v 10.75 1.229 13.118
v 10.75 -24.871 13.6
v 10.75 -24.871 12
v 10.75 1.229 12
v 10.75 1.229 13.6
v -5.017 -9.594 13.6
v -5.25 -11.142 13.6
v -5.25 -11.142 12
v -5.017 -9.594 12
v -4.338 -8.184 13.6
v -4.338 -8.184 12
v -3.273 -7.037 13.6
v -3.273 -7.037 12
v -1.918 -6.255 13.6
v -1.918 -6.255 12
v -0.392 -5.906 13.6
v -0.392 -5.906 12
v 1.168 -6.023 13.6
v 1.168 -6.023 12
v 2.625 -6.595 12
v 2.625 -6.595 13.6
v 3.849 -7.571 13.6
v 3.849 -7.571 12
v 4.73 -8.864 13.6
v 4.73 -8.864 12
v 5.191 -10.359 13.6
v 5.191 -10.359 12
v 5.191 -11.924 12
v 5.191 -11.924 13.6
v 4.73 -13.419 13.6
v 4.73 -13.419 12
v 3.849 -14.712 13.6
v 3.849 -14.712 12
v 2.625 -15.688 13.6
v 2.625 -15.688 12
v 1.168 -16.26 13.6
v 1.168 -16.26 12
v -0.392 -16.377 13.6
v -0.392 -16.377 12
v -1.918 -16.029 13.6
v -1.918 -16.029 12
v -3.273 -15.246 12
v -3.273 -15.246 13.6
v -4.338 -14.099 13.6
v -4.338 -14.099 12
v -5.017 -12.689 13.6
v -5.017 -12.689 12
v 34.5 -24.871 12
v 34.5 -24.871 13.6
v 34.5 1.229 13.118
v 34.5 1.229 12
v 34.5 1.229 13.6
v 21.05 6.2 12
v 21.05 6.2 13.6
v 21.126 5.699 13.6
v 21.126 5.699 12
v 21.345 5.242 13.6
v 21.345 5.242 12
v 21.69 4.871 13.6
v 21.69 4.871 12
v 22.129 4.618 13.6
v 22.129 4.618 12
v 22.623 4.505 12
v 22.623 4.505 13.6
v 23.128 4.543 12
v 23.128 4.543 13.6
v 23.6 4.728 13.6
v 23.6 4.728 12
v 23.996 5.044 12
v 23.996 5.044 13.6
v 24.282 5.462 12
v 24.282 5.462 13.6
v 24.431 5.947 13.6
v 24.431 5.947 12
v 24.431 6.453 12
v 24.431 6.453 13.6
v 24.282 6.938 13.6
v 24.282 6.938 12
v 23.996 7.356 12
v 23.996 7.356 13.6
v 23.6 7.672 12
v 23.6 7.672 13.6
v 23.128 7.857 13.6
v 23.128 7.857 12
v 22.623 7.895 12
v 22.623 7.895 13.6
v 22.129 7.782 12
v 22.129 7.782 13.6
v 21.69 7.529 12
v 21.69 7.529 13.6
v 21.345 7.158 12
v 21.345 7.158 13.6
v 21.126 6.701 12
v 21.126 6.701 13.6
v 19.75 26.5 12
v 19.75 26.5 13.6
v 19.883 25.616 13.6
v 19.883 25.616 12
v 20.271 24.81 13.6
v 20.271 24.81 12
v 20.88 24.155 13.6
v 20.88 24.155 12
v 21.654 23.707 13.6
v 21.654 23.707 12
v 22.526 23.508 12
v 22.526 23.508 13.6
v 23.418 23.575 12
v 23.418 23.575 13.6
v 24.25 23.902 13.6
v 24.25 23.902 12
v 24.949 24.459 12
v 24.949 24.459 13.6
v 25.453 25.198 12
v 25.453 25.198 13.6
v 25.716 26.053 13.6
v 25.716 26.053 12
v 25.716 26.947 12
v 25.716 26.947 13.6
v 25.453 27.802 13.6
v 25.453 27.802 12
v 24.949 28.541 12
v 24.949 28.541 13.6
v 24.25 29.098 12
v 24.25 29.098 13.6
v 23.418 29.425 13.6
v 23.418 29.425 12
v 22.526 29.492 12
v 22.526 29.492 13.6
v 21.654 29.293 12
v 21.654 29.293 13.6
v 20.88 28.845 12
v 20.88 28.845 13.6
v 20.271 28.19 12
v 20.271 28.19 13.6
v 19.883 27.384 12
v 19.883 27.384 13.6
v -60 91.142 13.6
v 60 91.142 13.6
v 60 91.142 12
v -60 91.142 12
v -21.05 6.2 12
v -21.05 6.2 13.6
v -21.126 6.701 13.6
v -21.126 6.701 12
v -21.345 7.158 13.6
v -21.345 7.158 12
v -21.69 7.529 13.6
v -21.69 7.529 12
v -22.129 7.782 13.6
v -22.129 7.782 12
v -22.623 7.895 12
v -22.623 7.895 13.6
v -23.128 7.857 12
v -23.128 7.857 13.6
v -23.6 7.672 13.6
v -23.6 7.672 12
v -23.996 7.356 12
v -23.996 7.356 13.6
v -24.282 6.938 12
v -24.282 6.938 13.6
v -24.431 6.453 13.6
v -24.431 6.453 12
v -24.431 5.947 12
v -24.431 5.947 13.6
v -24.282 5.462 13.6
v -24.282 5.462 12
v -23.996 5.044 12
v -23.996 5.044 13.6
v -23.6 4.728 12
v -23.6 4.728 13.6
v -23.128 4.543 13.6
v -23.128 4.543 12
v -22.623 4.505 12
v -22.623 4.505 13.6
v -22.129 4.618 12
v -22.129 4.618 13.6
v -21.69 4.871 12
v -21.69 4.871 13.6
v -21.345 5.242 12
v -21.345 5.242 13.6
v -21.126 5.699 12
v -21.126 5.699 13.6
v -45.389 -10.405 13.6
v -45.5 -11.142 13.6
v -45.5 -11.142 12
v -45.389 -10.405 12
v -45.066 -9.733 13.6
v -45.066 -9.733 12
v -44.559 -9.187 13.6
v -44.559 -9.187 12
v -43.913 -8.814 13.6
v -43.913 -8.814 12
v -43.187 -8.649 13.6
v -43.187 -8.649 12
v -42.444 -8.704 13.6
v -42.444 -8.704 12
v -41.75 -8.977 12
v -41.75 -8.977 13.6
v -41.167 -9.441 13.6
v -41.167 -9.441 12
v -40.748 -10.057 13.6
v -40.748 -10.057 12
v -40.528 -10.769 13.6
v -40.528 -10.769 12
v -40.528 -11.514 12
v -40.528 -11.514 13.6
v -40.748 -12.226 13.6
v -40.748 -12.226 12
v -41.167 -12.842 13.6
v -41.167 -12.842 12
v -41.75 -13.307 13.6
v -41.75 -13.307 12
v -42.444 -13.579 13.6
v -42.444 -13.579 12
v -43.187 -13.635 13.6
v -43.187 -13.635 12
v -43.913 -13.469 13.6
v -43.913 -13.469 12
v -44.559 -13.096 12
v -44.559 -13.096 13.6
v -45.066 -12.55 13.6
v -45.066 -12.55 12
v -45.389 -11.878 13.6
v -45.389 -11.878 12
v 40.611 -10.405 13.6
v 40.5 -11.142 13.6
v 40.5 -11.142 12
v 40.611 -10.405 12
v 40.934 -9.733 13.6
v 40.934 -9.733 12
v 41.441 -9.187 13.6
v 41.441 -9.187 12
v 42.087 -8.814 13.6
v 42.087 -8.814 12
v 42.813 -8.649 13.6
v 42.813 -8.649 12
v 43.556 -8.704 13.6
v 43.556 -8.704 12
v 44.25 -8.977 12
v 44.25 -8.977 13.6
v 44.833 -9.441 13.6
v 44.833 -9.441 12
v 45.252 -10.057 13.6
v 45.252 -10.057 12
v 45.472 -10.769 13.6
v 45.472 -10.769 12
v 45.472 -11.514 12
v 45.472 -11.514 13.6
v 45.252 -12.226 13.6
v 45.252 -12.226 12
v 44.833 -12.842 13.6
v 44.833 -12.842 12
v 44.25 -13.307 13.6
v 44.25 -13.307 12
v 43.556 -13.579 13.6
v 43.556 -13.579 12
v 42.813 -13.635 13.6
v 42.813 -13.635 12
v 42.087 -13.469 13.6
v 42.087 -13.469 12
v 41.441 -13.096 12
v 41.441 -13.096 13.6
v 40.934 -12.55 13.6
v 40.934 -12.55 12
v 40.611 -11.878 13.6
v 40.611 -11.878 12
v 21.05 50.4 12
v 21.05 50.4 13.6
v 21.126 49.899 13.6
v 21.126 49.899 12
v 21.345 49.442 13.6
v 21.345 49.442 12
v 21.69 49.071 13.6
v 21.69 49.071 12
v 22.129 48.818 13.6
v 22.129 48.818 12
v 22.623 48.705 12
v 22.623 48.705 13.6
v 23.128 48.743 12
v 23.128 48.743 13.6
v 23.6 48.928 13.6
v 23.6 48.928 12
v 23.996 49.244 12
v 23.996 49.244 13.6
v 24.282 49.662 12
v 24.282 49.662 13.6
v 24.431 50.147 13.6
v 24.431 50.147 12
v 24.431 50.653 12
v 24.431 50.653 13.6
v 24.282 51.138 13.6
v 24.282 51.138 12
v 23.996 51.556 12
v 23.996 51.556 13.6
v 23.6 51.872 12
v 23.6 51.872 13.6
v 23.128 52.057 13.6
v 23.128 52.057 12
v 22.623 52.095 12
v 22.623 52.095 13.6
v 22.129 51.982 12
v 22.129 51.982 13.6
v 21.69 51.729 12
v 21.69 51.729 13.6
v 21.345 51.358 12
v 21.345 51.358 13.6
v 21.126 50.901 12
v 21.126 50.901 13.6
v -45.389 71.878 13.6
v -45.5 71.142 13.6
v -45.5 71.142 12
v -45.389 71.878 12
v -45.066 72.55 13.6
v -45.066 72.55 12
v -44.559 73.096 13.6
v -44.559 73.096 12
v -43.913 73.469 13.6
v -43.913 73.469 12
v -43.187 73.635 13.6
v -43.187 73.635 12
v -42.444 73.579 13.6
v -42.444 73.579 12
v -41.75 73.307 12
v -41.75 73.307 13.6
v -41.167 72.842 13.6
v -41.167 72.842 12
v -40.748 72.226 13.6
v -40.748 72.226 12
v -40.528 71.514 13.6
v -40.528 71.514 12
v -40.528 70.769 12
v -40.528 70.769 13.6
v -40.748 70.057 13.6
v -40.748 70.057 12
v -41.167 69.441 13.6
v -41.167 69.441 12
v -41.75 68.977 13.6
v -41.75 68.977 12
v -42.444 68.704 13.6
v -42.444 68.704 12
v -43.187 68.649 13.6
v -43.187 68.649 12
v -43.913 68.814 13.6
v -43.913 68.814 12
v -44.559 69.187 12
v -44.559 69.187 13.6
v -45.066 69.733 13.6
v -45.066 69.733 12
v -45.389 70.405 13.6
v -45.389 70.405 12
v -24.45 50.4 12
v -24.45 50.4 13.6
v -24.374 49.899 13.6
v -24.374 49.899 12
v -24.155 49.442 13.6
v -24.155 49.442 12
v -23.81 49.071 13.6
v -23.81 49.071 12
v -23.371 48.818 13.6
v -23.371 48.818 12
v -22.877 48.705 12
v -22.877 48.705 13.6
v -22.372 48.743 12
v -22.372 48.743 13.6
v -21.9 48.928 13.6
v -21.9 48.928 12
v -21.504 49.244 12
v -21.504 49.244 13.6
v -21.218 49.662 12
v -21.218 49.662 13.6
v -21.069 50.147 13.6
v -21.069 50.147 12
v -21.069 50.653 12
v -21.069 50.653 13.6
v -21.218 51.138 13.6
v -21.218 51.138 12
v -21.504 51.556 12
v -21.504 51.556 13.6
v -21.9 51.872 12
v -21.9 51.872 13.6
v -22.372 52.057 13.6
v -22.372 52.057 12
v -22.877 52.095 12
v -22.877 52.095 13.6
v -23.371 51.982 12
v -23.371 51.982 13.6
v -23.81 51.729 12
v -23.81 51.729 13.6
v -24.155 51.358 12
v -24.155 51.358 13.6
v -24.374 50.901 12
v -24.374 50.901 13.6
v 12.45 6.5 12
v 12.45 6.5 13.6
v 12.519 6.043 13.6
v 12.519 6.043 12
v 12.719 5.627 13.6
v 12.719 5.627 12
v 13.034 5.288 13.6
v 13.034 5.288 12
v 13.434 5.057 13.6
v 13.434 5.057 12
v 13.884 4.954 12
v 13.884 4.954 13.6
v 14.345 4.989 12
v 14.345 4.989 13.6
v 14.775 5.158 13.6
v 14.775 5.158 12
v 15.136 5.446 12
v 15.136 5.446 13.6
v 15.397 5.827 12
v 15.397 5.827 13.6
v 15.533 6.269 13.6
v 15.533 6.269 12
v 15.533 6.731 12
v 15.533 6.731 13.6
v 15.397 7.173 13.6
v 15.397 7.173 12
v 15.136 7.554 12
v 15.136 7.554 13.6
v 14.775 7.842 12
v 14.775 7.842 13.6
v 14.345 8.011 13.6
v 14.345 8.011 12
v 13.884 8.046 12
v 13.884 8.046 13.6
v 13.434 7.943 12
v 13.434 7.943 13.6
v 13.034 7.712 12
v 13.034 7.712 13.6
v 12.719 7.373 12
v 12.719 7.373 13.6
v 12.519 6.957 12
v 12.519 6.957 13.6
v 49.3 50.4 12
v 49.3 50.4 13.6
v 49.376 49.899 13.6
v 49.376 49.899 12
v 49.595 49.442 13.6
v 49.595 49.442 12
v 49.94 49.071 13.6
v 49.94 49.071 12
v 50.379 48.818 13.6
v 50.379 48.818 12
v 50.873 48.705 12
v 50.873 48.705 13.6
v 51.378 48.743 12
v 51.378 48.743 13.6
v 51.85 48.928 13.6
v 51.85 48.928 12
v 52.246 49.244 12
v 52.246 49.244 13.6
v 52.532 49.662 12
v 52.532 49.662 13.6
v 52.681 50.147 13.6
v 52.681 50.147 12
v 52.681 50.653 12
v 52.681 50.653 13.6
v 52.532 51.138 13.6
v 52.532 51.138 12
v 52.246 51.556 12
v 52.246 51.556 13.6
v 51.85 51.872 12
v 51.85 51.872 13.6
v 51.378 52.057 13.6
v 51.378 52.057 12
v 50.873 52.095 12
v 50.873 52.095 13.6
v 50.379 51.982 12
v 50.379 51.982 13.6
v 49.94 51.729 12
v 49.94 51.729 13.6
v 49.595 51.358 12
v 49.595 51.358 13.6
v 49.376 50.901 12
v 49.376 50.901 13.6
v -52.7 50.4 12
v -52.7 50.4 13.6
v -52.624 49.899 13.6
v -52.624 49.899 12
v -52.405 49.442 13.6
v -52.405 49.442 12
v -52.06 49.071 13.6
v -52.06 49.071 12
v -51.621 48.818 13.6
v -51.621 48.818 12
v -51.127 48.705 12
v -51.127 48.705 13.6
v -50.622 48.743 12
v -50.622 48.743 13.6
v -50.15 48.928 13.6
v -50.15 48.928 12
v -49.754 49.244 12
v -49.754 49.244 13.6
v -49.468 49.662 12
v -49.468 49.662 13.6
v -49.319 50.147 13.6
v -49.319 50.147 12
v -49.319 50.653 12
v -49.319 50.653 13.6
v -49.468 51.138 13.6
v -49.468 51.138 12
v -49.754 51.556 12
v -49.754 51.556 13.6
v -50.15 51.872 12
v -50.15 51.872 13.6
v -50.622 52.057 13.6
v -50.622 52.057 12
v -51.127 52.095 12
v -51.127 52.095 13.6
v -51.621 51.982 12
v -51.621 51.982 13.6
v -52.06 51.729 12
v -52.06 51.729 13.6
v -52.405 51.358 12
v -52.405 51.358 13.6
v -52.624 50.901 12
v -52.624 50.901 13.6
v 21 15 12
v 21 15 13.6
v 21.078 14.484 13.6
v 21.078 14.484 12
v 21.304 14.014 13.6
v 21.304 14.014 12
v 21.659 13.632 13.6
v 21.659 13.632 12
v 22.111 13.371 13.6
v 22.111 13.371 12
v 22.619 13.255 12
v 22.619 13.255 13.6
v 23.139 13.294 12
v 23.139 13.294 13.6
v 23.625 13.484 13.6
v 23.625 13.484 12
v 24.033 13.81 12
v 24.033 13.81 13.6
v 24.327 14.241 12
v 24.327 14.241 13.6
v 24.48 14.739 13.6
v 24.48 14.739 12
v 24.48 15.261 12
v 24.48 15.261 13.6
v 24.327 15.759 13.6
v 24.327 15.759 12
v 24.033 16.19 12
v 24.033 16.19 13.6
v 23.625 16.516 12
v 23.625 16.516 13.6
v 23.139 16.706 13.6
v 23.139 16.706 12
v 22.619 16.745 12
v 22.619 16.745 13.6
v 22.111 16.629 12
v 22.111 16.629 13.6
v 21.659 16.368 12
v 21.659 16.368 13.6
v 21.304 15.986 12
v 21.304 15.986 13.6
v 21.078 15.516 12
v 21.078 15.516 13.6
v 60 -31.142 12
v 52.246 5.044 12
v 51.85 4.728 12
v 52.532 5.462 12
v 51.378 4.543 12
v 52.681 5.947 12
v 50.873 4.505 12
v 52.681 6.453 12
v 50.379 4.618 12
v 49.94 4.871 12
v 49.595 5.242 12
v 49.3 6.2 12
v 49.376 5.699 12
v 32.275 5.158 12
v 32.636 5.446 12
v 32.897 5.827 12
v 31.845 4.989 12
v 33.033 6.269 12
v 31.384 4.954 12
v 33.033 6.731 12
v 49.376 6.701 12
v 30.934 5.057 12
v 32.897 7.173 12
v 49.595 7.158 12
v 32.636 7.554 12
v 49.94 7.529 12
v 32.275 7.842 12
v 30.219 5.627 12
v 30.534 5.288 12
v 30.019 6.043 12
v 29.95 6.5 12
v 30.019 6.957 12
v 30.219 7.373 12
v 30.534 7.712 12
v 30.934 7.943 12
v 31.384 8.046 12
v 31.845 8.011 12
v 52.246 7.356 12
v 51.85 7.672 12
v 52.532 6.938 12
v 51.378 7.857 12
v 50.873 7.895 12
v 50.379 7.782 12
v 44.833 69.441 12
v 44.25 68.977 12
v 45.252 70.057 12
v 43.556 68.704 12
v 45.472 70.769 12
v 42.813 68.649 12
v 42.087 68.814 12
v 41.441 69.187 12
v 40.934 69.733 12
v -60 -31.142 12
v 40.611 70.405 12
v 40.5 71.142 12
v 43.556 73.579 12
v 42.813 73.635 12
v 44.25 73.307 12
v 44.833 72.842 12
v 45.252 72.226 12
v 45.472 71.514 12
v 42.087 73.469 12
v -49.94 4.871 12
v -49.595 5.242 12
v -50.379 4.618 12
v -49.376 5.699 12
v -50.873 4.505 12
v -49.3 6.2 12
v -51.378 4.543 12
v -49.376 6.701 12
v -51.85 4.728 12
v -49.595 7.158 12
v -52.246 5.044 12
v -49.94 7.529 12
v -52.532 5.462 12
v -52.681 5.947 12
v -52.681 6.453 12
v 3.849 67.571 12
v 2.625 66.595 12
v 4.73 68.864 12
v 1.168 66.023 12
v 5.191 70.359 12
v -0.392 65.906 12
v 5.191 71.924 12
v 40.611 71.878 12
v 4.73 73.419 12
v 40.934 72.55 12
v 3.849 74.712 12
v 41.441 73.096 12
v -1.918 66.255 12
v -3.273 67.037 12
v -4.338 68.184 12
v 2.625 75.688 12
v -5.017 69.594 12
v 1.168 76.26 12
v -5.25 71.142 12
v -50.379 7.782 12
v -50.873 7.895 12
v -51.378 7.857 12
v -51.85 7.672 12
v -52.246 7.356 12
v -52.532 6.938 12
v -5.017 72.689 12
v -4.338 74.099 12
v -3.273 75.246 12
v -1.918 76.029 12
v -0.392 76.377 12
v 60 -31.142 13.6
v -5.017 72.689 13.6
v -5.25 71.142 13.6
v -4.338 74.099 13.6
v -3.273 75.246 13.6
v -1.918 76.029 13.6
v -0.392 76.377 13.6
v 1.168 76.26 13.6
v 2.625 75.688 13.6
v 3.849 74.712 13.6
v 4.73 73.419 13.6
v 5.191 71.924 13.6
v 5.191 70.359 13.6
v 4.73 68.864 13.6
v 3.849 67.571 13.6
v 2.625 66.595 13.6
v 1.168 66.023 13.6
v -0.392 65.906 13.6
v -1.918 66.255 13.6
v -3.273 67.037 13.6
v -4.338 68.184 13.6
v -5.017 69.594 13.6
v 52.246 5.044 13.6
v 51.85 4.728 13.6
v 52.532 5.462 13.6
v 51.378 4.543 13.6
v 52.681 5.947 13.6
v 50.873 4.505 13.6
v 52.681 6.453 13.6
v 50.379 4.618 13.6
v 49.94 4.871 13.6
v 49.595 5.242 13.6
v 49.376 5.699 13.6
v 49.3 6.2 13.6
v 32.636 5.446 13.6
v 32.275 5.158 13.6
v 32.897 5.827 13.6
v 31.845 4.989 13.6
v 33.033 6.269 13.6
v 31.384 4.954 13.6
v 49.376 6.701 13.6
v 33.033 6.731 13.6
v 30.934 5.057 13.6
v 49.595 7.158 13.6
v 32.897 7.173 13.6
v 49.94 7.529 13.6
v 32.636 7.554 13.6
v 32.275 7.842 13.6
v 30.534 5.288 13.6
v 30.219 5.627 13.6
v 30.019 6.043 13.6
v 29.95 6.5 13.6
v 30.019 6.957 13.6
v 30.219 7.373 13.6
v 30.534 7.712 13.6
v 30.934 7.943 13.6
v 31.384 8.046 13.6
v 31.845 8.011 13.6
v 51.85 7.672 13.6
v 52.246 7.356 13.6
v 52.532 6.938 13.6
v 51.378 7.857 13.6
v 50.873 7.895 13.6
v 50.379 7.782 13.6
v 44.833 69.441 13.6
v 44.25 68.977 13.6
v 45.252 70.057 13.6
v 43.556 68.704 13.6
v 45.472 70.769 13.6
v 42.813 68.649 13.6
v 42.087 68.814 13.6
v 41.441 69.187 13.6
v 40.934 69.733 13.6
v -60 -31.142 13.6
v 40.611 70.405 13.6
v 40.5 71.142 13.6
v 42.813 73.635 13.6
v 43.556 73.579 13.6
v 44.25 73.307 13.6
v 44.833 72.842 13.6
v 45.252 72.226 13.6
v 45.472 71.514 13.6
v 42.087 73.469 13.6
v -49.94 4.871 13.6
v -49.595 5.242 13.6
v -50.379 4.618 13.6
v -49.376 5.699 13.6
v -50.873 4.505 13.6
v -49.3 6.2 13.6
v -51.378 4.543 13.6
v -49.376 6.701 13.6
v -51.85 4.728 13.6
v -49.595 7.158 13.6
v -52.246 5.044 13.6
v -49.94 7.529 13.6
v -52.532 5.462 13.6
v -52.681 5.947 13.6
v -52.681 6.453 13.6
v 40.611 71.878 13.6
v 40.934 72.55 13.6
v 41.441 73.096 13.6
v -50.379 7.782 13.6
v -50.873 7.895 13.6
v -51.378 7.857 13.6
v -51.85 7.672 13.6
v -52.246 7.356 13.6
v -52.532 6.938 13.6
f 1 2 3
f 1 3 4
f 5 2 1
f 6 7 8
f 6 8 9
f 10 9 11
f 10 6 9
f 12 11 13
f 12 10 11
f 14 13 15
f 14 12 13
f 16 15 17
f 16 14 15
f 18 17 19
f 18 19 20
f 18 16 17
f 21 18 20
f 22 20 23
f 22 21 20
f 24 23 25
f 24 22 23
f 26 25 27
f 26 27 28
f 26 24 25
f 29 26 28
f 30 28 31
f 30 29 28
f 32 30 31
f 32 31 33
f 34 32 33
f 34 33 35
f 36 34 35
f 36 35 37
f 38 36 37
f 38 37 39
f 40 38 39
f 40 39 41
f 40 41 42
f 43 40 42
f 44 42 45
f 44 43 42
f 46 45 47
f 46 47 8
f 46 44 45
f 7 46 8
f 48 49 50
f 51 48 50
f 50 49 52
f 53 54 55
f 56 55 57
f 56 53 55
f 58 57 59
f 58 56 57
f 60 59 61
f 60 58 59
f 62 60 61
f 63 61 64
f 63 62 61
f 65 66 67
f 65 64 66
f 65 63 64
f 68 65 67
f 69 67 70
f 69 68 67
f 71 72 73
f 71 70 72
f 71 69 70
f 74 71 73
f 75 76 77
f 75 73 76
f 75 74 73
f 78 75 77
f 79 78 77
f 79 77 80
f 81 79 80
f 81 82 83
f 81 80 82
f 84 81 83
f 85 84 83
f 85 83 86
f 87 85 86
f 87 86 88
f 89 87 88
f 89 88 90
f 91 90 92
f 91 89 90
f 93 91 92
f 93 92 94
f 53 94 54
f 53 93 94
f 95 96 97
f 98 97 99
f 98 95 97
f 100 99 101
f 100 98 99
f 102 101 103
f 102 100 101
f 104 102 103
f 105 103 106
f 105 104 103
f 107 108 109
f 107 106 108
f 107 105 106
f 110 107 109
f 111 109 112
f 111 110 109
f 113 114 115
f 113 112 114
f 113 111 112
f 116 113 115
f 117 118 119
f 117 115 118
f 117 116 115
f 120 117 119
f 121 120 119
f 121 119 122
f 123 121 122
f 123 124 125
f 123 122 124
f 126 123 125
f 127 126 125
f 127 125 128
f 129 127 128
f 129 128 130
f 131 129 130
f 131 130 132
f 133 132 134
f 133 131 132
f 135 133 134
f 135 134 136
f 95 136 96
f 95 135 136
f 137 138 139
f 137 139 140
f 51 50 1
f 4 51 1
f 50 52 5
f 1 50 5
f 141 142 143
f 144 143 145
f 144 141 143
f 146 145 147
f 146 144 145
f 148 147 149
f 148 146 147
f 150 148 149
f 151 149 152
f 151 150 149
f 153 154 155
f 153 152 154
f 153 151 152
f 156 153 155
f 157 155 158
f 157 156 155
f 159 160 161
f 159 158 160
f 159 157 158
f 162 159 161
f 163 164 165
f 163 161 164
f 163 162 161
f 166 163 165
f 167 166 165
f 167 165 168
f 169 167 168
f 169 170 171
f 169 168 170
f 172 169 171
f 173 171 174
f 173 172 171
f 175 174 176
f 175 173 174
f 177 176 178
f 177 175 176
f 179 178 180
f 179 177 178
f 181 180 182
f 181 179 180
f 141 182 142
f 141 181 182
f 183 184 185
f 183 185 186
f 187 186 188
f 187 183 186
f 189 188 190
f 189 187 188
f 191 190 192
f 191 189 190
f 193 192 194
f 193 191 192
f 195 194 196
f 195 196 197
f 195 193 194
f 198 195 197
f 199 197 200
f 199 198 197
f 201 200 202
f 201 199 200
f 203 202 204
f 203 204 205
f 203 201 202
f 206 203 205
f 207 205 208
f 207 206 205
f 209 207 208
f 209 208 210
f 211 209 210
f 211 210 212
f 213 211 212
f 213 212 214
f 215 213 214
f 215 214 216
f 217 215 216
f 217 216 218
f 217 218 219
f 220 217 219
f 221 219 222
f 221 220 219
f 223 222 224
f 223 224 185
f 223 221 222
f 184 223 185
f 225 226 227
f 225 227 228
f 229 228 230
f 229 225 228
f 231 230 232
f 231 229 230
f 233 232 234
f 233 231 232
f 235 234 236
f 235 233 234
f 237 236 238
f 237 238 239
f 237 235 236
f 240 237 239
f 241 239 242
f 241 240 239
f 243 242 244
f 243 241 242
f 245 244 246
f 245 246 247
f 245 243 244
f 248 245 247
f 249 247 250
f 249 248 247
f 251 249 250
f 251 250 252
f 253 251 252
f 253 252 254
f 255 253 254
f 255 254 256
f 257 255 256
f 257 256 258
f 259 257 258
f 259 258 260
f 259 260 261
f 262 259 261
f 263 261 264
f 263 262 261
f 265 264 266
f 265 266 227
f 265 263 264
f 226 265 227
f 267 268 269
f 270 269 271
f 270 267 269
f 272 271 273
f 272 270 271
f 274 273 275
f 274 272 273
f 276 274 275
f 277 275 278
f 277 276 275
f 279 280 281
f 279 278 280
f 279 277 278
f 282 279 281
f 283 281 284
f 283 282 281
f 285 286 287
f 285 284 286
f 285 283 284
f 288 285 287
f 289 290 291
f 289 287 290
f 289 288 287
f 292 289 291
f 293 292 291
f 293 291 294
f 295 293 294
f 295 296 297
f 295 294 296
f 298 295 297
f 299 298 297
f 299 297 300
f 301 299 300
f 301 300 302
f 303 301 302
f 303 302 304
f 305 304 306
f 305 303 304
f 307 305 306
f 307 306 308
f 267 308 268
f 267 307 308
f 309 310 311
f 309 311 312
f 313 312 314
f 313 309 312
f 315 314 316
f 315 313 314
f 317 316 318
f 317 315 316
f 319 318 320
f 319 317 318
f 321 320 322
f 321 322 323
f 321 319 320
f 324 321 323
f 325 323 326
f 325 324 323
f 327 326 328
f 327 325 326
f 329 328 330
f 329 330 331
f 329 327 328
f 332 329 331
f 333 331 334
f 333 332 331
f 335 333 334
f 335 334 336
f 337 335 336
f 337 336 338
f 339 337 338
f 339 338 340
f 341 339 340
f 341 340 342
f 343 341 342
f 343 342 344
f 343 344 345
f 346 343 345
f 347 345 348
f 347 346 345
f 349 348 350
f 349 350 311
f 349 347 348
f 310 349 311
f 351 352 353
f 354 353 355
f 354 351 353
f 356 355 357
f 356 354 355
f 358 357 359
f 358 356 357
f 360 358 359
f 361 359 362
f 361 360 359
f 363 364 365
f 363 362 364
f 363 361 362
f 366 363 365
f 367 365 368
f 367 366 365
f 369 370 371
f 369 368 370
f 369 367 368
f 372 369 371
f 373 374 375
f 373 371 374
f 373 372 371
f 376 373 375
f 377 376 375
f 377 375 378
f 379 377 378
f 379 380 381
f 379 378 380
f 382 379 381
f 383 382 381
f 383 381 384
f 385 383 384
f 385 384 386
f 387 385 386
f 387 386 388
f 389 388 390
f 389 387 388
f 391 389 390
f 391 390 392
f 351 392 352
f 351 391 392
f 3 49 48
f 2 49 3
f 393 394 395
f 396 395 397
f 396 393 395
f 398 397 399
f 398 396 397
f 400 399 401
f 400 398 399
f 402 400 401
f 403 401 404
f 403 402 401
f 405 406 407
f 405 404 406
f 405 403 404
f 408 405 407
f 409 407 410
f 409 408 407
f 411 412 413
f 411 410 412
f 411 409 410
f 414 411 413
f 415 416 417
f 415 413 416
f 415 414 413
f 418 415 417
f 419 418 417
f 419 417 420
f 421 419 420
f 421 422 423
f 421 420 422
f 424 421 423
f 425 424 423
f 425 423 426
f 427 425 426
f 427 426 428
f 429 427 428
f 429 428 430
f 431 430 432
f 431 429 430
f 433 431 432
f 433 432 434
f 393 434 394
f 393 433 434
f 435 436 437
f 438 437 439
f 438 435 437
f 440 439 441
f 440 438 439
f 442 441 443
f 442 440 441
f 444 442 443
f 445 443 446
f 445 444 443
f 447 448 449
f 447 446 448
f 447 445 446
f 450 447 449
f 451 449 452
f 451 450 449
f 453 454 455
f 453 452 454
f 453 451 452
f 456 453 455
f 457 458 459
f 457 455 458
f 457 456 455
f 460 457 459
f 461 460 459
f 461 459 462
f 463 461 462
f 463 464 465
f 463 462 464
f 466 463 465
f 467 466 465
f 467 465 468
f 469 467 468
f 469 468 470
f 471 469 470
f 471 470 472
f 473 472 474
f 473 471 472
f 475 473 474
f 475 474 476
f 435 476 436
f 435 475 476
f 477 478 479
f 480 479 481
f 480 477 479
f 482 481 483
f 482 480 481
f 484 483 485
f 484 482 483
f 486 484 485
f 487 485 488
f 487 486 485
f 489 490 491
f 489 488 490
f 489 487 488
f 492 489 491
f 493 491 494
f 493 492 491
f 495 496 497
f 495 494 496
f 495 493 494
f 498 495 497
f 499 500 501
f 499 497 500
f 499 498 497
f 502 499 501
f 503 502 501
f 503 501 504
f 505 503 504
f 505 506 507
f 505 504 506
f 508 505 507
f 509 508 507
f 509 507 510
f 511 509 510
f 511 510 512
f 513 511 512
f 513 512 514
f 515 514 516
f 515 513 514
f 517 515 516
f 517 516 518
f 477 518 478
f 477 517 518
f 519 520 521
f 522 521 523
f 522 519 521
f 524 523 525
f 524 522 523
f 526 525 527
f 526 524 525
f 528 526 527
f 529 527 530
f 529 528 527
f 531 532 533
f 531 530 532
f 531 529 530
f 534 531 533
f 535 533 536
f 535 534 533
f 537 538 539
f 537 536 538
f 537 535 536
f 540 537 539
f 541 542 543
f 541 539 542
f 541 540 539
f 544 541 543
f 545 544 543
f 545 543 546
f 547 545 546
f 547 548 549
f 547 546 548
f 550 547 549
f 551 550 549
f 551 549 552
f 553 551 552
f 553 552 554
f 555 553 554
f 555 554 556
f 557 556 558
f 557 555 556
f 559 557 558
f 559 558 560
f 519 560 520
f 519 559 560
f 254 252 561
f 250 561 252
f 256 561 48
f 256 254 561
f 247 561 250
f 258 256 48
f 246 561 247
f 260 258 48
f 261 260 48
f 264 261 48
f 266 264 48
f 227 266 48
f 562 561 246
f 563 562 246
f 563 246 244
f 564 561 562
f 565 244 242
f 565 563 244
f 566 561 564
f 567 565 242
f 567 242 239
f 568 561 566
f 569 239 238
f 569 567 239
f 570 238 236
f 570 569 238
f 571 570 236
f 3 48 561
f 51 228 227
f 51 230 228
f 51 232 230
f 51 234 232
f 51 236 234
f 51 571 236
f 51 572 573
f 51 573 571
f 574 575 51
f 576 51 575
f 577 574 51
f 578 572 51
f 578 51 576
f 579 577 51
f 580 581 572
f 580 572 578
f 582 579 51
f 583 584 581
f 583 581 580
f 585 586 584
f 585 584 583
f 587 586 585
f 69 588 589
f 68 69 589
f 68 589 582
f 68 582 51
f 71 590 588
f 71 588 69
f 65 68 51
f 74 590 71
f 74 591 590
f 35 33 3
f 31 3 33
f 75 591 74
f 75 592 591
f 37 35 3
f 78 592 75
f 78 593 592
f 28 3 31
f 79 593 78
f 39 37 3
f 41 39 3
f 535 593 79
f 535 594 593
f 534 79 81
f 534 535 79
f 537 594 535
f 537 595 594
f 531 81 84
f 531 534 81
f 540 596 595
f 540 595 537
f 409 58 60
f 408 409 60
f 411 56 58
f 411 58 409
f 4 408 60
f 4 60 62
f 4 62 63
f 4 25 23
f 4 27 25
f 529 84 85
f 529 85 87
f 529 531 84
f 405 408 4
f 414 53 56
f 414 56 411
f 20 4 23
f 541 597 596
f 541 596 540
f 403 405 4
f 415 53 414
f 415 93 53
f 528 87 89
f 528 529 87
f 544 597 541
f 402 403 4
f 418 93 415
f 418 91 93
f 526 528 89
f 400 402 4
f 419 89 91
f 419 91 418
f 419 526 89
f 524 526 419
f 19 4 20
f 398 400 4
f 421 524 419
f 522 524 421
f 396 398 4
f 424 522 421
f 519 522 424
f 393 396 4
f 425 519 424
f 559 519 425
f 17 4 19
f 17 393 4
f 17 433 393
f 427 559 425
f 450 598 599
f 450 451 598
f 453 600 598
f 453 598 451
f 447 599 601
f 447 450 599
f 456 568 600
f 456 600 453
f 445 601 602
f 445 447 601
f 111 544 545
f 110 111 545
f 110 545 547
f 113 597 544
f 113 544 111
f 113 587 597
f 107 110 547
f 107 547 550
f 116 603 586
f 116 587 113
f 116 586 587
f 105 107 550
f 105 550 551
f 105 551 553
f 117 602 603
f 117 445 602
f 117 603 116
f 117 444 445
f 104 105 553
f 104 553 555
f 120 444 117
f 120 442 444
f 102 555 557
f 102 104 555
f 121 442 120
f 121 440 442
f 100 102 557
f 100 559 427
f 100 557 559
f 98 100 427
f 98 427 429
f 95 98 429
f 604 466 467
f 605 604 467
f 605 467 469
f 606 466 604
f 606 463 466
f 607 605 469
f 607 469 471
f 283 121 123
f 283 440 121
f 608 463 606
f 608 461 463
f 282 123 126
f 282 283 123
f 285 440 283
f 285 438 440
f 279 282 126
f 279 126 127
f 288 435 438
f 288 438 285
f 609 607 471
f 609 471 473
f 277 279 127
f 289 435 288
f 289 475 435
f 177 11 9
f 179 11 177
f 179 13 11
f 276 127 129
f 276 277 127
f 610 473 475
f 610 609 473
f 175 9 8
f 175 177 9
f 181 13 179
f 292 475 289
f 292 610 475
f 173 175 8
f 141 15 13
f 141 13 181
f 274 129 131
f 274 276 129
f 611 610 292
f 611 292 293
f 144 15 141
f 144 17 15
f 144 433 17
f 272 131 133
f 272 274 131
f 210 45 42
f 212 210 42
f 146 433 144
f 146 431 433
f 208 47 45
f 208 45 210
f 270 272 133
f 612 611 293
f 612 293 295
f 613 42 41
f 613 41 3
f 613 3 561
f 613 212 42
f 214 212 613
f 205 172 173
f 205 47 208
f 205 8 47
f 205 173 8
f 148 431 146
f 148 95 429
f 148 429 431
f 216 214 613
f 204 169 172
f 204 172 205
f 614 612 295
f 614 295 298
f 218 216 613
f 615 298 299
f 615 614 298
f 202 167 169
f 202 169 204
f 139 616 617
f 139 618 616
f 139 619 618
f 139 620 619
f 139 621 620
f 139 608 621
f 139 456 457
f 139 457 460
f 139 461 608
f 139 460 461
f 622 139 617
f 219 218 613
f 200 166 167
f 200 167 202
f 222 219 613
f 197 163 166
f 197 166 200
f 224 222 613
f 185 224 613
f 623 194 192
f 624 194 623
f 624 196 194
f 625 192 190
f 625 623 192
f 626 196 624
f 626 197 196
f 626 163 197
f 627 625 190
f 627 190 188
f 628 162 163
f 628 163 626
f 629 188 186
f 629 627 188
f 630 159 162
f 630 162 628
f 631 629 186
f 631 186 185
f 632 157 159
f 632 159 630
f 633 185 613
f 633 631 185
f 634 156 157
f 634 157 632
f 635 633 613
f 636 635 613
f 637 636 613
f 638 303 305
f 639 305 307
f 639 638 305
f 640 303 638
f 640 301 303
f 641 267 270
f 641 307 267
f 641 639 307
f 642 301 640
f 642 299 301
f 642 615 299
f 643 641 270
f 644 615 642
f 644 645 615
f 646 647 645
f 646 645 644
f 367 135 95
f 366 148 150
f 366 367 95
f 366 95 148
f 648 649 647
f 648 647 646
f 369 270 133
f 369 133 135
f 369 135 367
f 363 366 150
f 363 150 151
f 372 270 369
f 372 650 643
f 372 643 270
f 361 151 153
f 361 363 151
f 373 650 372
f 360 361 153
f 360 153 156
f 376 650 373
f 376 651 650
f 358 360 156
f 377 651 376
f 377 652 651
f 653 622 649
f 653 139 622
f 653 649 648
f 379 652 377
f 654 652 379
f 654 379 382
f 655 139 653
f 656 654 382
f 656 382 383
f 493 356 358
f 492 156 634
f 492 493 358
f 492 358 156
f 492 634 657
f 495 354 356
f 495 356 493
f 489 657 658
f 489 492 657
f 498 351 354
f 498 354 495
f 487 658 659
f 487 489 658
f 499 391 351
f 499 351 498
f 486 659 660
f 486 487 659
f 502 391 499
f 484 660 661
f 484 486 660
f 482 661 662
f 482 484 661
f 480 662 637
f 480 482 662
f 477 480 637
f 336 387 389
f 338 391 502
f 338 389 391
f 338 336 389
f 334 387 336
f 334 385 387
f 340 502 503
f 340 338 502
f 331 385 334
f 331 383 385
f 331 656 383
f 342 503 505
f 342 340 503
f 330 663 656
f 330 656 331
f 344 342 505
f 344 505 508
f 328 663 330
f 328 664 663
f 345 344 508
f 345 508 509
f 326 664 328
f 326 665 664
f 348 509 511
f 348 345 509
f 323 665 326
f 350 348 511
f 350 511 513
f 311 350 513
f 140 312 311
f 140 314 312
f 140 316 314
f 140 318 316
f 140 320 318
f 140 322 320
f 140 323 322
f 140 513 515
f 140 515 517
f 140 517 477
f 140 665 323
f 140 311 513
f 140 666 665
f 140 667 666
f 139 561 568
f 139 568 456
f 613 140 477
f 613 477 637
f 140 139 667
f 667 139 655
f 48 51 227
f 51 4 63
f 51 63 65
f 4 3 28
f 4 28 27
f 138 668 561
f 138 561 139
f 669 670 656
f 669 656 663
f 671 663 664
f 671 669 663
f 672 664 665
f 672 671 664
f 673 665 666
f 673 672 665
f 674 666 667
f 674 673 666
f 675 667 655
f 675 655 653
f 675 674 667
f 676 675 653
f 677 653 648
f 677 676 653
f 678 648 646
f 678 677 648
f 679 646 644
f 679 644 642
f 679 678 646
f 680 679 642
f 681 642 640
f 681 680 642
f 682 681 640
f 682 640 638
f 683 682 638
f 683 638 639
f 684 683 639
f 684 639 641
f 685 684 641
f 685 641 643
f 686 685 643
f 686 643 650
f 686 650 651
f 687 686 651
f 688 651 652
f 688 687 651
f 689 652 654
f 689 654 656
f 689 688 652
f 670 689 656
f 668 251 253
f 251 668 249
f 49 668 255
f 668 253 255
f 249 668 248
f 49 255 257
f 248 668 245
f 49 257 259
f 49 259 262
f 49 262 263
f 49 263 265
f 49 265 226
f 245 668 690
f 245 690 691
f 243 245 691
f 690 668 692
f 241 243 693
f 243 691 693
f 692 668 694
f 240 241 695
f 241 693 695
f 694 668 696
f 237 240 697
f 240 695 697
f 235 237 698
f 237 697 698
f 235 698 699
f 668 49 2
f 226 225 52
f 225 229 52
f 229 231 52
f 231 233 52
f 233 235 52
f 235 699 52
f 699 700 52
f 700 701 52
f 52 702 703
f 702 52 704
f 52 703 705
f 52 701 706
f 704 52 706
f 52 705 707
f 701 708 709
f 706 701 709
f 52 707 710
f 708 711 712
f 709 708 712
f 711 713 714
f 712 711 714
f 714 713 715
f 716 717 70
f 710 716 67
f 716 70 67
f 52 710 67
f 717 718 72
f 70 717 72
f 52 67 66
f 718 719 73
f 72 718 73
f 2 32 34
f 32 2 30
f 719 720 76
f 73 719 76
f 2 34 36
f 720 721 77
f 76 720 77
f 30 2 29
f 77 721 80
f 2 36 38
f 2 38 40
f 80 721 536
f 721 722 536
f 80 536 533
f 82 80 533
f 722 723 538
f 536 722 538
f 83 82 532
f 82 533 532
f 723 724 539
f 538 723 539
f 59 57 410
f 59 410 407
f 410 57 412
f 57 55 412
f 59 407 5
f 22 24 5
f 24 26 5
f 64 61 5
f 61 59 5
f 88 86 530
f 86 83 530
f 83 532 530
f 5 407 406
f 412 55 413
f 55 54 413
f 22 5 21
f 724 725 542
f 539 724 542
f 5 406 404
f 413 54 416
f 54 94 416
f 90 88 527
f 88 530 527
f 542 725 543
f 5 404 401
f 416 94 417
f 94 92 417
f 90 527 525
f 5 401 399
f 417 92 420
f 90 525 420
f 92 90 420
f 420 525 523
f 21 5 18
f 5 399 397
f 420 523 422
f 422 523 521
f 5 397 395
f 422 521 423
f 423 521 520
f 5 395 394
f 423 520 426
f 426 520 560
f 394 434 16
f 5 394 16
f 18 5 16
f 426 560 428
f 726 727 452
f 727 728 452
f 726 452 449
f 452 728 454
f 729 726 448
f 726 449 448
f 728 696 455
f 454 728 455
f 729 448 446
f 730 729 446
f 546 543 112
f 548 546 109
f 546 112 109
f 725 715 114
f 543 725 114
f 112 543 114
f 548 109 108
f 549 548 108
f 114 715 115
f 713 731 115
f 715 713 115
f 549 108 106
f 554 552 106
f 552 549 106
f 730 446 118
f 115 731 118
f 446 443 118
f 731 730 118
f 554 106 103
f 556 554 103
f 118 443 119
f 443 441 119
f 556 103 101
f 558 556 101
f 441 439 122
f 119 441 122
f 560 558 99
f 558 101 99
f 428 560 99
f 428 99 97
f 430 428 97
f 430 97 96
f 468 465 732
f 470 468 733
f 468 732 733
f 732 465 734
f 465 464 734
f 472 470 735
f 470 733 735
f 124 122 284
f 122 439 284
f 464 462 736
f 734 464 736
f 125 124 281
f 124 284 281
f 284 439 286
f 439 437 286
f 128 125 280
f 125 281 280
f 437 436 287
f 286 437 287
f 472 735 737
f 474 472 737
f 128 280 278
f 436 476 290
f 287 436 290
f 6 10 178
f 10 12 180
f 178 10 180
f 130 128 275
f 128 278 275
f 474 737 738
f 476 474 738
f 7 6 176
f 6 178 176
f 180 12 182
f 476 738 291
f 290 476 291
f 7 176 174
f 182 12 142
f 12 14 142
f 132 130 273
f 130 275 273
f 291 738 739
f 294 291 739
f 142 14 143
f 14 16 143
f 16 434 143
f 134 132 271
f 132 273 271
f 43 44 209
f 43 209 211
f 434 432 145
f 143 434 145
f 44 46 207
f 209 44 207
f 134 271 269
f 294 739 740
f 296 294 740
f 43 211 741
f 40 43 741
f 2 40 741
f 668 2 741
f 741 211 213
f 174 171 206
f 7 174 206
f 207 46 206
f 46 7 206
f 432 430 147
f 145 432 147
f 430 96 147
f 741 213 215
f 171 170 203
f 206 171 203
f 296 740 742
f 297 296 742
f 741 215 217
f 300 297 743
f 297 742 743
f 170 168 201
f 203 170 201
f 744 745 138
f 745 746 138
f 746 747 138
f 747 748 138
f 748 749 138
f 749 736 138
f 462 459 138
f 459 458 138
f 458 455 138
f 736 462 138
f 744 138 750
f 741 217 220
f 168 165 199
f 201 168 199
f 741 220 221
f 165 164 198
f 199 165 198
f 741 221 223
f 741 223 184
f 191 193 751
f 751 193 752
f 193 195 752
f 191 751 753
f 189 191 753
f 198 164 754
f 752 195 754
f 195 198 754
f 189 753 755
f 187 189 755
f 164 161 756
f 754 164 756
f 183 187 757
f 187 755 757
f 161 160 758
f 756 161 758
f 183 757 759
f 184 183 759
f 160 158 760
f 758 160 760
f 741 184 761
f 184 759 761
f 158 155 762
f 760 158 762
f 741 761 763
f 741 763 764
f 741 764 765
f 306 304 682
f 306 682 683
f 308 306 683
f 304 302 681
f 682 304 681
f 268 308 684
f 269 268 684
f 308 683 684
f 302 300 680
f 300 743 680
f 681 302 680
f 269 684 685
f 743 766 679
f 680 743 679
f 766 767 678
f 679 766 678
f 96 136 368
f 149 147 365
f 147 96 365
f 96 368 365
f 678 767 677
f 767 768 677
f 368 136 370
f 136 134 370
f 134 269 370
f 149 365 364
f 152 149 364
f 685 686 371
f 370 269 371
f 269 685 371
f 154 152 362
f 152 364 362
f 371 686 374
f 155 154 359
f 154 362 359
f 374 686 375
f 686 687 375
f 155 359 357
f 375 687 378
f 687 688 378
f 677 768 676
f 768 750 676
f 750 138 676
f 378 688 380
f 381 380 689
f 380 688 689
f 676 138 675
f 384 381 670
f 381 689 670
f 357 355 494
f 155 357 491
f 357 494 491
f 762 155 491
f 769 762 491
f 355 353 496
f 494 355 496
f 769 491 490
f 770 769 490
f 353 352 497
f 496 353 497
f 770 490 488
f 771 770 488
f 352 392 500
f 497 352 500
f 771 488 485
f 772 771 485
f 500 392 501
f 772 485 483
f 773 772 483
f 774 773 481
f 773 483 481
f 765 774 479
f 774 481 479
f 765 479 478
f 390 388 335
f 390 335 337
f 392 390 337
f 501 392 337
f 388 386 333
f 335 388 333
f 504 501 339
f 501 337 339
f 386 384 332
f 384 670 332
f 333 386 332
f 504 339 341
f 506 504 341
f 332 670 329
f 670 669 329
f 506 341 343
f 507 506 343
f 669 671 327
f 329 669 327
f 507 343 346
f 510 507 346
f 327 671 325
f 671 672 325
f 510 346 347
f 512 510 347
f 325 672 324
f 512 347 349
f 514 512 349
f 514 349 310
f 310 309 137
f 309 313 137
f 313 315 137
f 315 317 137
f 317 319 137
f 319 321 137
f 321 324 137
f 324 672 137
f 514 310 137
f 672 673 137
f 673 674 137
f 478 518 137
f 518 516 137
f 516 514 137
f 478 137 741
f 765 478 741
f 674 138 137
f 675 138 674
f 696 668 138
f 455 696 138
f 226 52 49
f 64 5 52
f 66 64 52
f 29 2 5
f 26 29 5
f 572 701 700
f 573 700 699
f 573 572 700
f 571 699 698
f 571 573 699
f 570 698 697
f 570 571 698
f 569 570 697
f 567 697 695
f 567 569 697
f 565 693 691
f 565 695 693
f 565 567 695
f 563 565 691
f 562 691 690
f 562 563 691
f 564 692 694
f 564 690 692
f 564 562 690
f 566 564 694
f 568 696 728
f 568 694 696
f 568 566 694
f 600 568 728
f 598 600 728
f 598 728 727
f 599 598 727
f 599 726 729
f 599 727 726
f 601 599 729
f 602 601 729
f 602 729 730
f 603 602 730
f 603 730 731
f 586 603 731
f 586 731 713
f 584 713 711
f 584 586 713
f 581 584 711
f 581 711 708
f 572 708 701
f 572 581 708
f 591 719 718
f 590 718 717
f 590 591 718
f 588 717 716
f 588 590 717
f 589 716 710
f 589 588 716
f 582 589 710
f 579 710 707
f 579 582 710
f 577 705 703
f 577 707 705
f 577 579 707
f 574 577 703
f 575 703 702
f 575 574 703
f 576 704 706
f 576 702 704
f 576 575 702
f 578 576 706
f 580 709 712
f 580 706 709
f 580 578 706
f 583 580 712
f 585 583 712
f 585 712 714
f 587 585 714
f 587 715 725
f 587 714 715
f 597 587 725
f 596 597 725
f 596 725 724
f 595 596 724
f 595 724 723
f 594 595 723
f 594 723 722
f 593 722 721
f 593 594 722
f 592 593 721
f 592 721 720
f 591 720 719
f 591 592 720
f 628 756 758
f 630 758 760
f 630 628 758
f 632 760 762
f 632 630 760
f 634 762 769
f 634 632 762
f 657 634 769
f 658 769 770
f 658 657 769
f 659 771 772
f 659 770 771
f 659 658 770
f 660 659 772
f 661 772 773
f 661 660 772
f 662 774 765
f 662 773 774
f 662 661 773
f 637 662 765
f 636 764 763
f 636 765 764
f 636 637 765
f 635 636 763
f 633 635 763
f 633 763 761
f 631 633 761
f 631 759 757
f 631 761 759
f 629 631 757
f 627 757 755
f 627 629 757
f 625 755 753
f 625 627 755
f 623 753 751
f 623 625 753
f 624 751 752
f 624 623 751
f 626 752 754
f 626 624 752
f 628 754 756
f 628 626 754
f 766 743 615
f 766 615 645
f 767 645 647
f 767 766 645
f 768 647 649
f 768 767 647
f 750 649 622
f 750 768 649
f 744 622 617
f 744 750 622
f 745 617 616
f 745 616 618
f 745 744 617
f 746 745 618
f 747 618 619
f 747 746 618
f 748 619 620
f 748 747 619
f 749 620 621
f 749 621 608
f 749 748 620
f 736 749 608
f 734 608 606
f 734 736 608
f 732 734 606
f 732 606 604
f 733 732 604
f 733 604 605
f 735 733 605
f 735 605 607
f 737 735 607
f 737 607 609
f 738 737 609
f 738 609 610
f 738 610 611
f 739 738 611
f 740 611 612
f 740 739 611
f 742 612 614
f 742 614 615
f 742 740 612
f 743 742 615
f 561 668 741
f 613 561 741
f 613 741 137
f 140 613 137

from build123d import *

# Parameters (mm, degrees)
SKETCH1_R                  = 5.25
SKETCH1_R_2                = 2.5
BOSS_EXTRUDE1_DEPTH        = 1.6
SKETCH3_W                  = 120
SKETCH3_H                  = 1.6
BOSS_EXTRUDE3_DEPTH        = 60
SKETCH4_R                  = 3
SKETCH4_R_2                = 1.55
SKETCH4_R_3                = 1.75
CUT_EXTRUDE1_DEPTH         = 10
SKETCH6_R                  = 1.7
CUT_EXTRUDE2_DEPTH         = 25
CONVERT_SOLID1_START       = -61
CONVERT_SOLID1_DEPTH       = 122
CONVERT_SOLID1_START_2     = -60
CONVERT_SOLID1_2_DEPTH     = 120
CUT_EXTRUDE3_OUTLINE_W     = 120
CUT_EXTRUDE3_OUTLINE_H     = 60
CUT_EXTRUDE3_OUTLINE_R     = 1.7
CUT_EXTRUDE3_OUTLINE_R_2   = 1.55
CUT_EXTRUDE3_OUTLINE_R_3   = 1.75
CUT_EXTRUDE3_OUTLINE_R_4   = 3
CUT_EXTRUDE3_DEPTH         = 32
CUT_EXTRUDE3_START         = -1.6
CUT_EXTRUDE3_2_OUTLINE_W   = 23.75
CUT_EXTRUDE3_2_OUTLINE_H   = 1.229203673
CUT_EXTRUDE3_2_DEPTH       = 1.6
CUT_EXTRUDE3_3_OUTLINE_W   = 120
CUT_EXTRUDE3_3_OUTLINE_H   = 122.283185308
CUT_EXTRUDE3_3_OUTLINE_W_2 = 23.75
CUT_EXTRUDE3_3_OUTLINE_H_2 = 26.1
CUT_EXTRUDE3_3_OUTLINE_R   = 2.5
CUT_EXTRUDE3_3_OUTLINE_R_2 = 5.25
CUT_EXTRUDE3_3_OUTLINE_R_3 = 1.7
CUT_EXTRUDE3_3_OUTLINE_R_4 = 1.55
CUT_EXTRUDE3_3_OUTLINE_R_5 = 1.75
CUT_EXTRUDE3_3_OUTLINE_R_6 = 3
CUT_EXTRUDE3_3_DEPTH       = 1.6


with BuildPart() as part:
    # Sketch1 → Boss-Extrude1 (new body)
    with BuildSketch(Plane(origin=(0, 0, 0), x_dir=(1, 0, 0), z_dir=(0, 1, 0))):
        Polygon((-60, -12), (-60, 20), (60, 20), (60, -12), (34.5, -12), (11, -12), align=None)
        with Locations(Location((0, 0, 0), (0, 0, 270))):
            Circle(SKETCH1_R, mode=Mode.SUBTRACT)
        with Locations(Location((-43, 0, 0), (0, 0, 270))):
            Circle(SKETCH1_R_2, mode=Mode.SUBTRACT)
        with Locations(Location((43, 0, 0), (0, 0, 90))):
            Circle(SKETCH1_R_2, mode=Mode.SUBTRACT)
    boss_extrude1 = extrude(amount=BOSS_EXTRUDE1_DEPTH)

    # Sketch3 → Boss-Extrude3 (add)
    with BuildSketch(Plane.XZ):
        with Locations((0, 12.8)):
            Rectangle(SKETCH3_W, SKETCH3_H)
    extrude(amount=-BOSS_EXTRUDE3_DEPTH)

    # Mirror1: Boss-Extrude1 across plane
    add(boss_extrude1.mirror(Plane.ZX.offset(30)))

    # Sketch4 → Cut-Extrude1 (cut)
    with BuildSketch(Plane.XY.offset(12)):
        with Locations(Location((22.75, 26.5, 0), (0, 0, 180))):
            Circle(SKETCH4_R)
        with Locations(Location((31.5, 6.5, 0), (0, 0, 180))):
            Circle(SKETCH4_R_2)
        with Locations(Location((14, 6.5, 0), (0, 0, 180))):
            Circle(SKETCH4_R_2)
        with Locations(Location((22.75, 15, 0), (0, 0, 180))):
            Circle(SKETCH4_R_3)
    extrude(amount=CUT_EXTRUDE1_DEPTH, mode=Mode.SUBTRACT)

    # Sketch6 → Cut-Extrude2 (cut)
    with BuildSketch(Plane(origin=(124.244525073, 40.7, 12), x_dir=(1, 0, 0), z_dir=(0, 0, 1))):
        with Locations(Location((-175.244525073, 9.7, 0), (0, 0, 180))):
            Circle(SKETCH6_R)
        with Locations(Location((-146.994525073, 9.7, 0), (0, 0, 180))):
            Circle(SKETCH6_R)
        with Locations(Location((-101.494525073, 9.7, 0), (0, 0, 180))):
            Circle(SKETCH6_R)
        with Locations(Location((-73.244525073, 9.7, 0), (0, 0, 180))):
            Circle(SKETCH6_R)
        with Locations((-175.244525073, -34.5)):
            Circle(SKETCH6_R)
        with Locations((-146.994525073, -34.5)):
            Circle(SKETCH6_R)
        with Locations(Location((-101.494525073, -34.5, 0), (0, 0, 180))):
            Circle(SKETCH6_R)
        with Locations(Location((-73.244525073, -34.5, 0), (0, 0, 180))):
            Circle(SKETCH6_R)
    extrude(amount=CUT_EXTRUDE2_DEPTH, mode=Mode.SUBTRACT)

    # Convert-Solid1: read off the stored shape, not the designer's step
    # Convert-Solid1 outline → Convert-Solid1 (cut)
    with BuildSketch(Plane.YZ.offset(CONVERT_SOLID1_START)):
        with BuildLine():
            Line((60, 13.6), (57.2, 13.6))
            ThreePointArc((57.2, 13.6), (59.179898987, 12.779898987), (60, 10.8))
            Line((60, 10.8), (60, 13.6))
        make_face()
        with BuildLine():
            ThreePointArc((0, 10.8), (0.820101013, 12.779898987), (2.8, 13.6))
            Line((2.8, 13.6), (0, 13.6))
            Line((0, 13.6), (0, 10.8))
        make_face()
    extrude(amount=CONVERT_SOLID1_DEPTH, mode=Mode.SUBTRACT)

    # Convert-Solid1 2 outline → Convert-Solid1 2 (add)
    with BuildSketch(Plane.YZ.offset(CONVERT_SOLID1_START_2)):
        with BuildLine():
            Line((58.4, 12), (57.2, 12))
            ThreePointArc((57.2, 12), (58.048528137, 11.648528137), (58.4, 10.8))
            Line((58.4, 10.8), (58.4, 12))
        make_face()
        with BuildLine():
            ThreePointArc((1.6, 10.8), (1.951471863, 11.648528137), (2.8, 12))
            Line((2.8, 12), (1.6, 12))
            Line((1.6, 12), (1.6, 10.8))
        make_face()
    extrude(amount=CONVERT_SOLID1_2_DEPTH)

    # Cut-Extrude3: read off the stored shape, not the designer's step
    # Cut-Extrude3 outline → Cut-Extrude3 (cut)
    with BuildSketch(Plane(origin=(0, 0, 12), x_dir=(-1, 0, 0), z_dir=(0, 0, -1))):
        with Locations((0, 30)):
            Rectangle(CUT_EXTRUDE3_OUTLINE_W, CUT_EXTRUDE3_OUTLINE_H)
        with Locations((51, 50.4)):
            Circle(CUT_EXTRUDE3_OUTLINE_R, mode=Mode.SUBTRACT)
        with Locations((-51, 6.2)):
            Circle(CUT_EXTRUDE3_OUTLINE_R, mode=Mode.SUBTRACT)
        with Locations((-31.5, 6.5)):
            Circle(CUT_EXTRUDE3_OUTLINE_R_2, mode=Mode.SUBTRACT)
        with Locations((-22.75, 6.2)):
            Circle(CUT_EXTRUDE3_OUTLINE_R, mode=Mode.SUBTRACT)
        with Locations((-14, 6.5)):
            Circle(CUT_EXTRUDE3_OUTLINE_R_2, mode=Mode.SUBTRACT)
        with Locations((-22.75, 15)):
            Circle(CUT_EXTRUDE3_OUTLINE_R_3, mode=Mode.SUBTRACT)
        with Locations((-22.75, 26.5)):
            Circle(CUT_EXTRUDE3_OUTLINE_R_4, mode=Mode.SUBTRACT)
        with Locations((22.75, 6.2)):
            Circle(CUT_EXTRUDE3_OUTLINE_R, mode=Mode.SUBTRACT)
        with Locations((51, 6.2)):
            Circle(CUT_EXTRUDE3_OUTLINE_R, mode=Mode.SUBTRACT)
        with Locations((-51, 50.4)):
            Circle(CUT_EXTRUDE3_OUTLINE_R, mode=Mode.SUBTRACT)
        with Locations((-22.75, 50.4)):
            Circle(CUT_EXTRUDE3_OUTLINE_R, mode=Mode.SUBTRACT)
        with Locations((22.75, 50.4)):
            Circle(CUT_EXTRUDE3_OUTLINE_R, mode=Mode.SUBTRACT)
    extrude(amount=CUT_EXTRUDE3_DEPTH, mode=Mode.SUBTRACT)

    # Cut-Extrude3 2 outline → Cut-Extrude3 2 (cut)
    with BuildSketch(Plane(origin=(0, 0, 12), x_dir=(-1, 0, 0), z_dir=(0, 0, -1)).offset(CUT_EXTRUDE3_START)):
        with Locations((-22.625, 0.614601836)):
            Rectangle(CUT_EXTRUDE3_2_OUTLINE_W, CUT_EXTRUDE3_2_OUTLINE_H)
    extrude(amount=CUT_EXTRUDE3_2_DEPTH, mode=Mode.SUBTRACT)

    # Cut-Extrude3 3 outline → Cut-Extrude3 3 (add)
    with BuildSketch(Plane(origin=(0, 0, 12), x_dir=(-1, 0, 0), z_dir=(0, 0, -1)).offset(CUT_EXTRUDE3_START)):
        with Locations((0, 30)):
            Rectangle(CUT_EXTRUDE3_3_OUTLINE_W, CUT_EXTRUDE3_3_OUTLINE_H)
        with Locations((-22.625, -11.820796327)):
            Rectangle(CUT_EXTRUDE3_3_OUTLINE_W_2, CUT_EXTRUDE3_3_OUTLINE_H_2, mode=Mode.SUBTRACT)
        with Locations((-43, -11.141592654)):
            Circle(CUT_EXTRUDE3_3_OUTLINE_R, mode=Mode.SUBTRACT)
        with Locations((0, -11.141592654)):
            Circle(CUT_EXTRUDE3_3_OUTLINE_R_2, mode=Mode.SUBTRACT)
        with Locations((43, -11.141592654)):
            Circle(CUT_EXTRUDE3_3_OUTLINE_R, mode=Mode.SUBTRACT)
        with Locations((51, 50.4)):
            Circle(CUT_EXTRUDE3_3_OUTLINE_R_3, mode=Mode.SUBTRACT)
        with Locations((-51, 6.2)):
            Circle(CUT_EXTRUDE3_3_OUTLINE_R_3, mode=Mode.SUBTRACT)
        with Locations((-31.5, 6.5)):
            Circle(CUT_EXTRUDE3_3_OUTLINE_R_4, mode=Mode.SUBTRACT)
        with Locations((-22.75, 6.2)):
            Circle(CUT_EXTRUDE3_3_OUTLINE_R_3, mode=Mode.SUBTRACT)
        with Locations((-14, 6.5)):
            Circle(CUT_EXTRUDE3_3_OUTLINE_R_4, mode=Mode.SUBTRACT)
        with Locations((-22.75, 15)):
            Circle(CUT_EXTRUDE3_3_OUTLINE_R_5, mode=Mode.SUBTRACT)
        with Locations((-22.75, 26.5)):
            Circle(CUT_EXTRUDE3_3_OUTLINE_R_6, mode=Mode.SUBTRACT)
        with Locations((22.75, 6.2)):
            Circle(CUT_EXTRUDE3_3_OUTLINE_R_3, mode=Mode.SUBTRACT)
        with Locations((51, 6.2)):
            Circle(CUT_EXTRUDE3_3_OUTLINE_R_3, mode=Mode.SUBTRACT)
        with Locations((-51, 50.4)):
            Circle(CUT_EXTRUDE3_3_OUTLINE_R_3, mode=Mode.SUBTRACT)
        with Locations((-22.75, 50.4)):
            Circle(CUT_EXTRUDE3_3_OUTLINE_R_3, mode=Mode.SUBTRACT)
        with Locations((22.75, 50.4)):
            Circle(CUT_EXTRUDE3_3_OUTLINE_R_3, mode=Mode.SUBTRACT)
        with Locations((43, 71.141592654)):
            Circle(CUT_EXTRUDE3_3_OUTLINE_R, mode=Mode.SUBTRACT)
        with Locations((-43, 71.141592654)):
            Circle(CUT_EXTRUDE3_3_OUTLINE_R, mode=Mode.SUBTRACT)
        with Locations((0, 71.141592654)):
            Circle(CUT_EXTRUDE3_3_OUTLINE_R_2, mode=Mode.SUBTRACT)
    extrude(amount=CUT_EXTRUDE3_3_DEPTH)


solid = part.part
